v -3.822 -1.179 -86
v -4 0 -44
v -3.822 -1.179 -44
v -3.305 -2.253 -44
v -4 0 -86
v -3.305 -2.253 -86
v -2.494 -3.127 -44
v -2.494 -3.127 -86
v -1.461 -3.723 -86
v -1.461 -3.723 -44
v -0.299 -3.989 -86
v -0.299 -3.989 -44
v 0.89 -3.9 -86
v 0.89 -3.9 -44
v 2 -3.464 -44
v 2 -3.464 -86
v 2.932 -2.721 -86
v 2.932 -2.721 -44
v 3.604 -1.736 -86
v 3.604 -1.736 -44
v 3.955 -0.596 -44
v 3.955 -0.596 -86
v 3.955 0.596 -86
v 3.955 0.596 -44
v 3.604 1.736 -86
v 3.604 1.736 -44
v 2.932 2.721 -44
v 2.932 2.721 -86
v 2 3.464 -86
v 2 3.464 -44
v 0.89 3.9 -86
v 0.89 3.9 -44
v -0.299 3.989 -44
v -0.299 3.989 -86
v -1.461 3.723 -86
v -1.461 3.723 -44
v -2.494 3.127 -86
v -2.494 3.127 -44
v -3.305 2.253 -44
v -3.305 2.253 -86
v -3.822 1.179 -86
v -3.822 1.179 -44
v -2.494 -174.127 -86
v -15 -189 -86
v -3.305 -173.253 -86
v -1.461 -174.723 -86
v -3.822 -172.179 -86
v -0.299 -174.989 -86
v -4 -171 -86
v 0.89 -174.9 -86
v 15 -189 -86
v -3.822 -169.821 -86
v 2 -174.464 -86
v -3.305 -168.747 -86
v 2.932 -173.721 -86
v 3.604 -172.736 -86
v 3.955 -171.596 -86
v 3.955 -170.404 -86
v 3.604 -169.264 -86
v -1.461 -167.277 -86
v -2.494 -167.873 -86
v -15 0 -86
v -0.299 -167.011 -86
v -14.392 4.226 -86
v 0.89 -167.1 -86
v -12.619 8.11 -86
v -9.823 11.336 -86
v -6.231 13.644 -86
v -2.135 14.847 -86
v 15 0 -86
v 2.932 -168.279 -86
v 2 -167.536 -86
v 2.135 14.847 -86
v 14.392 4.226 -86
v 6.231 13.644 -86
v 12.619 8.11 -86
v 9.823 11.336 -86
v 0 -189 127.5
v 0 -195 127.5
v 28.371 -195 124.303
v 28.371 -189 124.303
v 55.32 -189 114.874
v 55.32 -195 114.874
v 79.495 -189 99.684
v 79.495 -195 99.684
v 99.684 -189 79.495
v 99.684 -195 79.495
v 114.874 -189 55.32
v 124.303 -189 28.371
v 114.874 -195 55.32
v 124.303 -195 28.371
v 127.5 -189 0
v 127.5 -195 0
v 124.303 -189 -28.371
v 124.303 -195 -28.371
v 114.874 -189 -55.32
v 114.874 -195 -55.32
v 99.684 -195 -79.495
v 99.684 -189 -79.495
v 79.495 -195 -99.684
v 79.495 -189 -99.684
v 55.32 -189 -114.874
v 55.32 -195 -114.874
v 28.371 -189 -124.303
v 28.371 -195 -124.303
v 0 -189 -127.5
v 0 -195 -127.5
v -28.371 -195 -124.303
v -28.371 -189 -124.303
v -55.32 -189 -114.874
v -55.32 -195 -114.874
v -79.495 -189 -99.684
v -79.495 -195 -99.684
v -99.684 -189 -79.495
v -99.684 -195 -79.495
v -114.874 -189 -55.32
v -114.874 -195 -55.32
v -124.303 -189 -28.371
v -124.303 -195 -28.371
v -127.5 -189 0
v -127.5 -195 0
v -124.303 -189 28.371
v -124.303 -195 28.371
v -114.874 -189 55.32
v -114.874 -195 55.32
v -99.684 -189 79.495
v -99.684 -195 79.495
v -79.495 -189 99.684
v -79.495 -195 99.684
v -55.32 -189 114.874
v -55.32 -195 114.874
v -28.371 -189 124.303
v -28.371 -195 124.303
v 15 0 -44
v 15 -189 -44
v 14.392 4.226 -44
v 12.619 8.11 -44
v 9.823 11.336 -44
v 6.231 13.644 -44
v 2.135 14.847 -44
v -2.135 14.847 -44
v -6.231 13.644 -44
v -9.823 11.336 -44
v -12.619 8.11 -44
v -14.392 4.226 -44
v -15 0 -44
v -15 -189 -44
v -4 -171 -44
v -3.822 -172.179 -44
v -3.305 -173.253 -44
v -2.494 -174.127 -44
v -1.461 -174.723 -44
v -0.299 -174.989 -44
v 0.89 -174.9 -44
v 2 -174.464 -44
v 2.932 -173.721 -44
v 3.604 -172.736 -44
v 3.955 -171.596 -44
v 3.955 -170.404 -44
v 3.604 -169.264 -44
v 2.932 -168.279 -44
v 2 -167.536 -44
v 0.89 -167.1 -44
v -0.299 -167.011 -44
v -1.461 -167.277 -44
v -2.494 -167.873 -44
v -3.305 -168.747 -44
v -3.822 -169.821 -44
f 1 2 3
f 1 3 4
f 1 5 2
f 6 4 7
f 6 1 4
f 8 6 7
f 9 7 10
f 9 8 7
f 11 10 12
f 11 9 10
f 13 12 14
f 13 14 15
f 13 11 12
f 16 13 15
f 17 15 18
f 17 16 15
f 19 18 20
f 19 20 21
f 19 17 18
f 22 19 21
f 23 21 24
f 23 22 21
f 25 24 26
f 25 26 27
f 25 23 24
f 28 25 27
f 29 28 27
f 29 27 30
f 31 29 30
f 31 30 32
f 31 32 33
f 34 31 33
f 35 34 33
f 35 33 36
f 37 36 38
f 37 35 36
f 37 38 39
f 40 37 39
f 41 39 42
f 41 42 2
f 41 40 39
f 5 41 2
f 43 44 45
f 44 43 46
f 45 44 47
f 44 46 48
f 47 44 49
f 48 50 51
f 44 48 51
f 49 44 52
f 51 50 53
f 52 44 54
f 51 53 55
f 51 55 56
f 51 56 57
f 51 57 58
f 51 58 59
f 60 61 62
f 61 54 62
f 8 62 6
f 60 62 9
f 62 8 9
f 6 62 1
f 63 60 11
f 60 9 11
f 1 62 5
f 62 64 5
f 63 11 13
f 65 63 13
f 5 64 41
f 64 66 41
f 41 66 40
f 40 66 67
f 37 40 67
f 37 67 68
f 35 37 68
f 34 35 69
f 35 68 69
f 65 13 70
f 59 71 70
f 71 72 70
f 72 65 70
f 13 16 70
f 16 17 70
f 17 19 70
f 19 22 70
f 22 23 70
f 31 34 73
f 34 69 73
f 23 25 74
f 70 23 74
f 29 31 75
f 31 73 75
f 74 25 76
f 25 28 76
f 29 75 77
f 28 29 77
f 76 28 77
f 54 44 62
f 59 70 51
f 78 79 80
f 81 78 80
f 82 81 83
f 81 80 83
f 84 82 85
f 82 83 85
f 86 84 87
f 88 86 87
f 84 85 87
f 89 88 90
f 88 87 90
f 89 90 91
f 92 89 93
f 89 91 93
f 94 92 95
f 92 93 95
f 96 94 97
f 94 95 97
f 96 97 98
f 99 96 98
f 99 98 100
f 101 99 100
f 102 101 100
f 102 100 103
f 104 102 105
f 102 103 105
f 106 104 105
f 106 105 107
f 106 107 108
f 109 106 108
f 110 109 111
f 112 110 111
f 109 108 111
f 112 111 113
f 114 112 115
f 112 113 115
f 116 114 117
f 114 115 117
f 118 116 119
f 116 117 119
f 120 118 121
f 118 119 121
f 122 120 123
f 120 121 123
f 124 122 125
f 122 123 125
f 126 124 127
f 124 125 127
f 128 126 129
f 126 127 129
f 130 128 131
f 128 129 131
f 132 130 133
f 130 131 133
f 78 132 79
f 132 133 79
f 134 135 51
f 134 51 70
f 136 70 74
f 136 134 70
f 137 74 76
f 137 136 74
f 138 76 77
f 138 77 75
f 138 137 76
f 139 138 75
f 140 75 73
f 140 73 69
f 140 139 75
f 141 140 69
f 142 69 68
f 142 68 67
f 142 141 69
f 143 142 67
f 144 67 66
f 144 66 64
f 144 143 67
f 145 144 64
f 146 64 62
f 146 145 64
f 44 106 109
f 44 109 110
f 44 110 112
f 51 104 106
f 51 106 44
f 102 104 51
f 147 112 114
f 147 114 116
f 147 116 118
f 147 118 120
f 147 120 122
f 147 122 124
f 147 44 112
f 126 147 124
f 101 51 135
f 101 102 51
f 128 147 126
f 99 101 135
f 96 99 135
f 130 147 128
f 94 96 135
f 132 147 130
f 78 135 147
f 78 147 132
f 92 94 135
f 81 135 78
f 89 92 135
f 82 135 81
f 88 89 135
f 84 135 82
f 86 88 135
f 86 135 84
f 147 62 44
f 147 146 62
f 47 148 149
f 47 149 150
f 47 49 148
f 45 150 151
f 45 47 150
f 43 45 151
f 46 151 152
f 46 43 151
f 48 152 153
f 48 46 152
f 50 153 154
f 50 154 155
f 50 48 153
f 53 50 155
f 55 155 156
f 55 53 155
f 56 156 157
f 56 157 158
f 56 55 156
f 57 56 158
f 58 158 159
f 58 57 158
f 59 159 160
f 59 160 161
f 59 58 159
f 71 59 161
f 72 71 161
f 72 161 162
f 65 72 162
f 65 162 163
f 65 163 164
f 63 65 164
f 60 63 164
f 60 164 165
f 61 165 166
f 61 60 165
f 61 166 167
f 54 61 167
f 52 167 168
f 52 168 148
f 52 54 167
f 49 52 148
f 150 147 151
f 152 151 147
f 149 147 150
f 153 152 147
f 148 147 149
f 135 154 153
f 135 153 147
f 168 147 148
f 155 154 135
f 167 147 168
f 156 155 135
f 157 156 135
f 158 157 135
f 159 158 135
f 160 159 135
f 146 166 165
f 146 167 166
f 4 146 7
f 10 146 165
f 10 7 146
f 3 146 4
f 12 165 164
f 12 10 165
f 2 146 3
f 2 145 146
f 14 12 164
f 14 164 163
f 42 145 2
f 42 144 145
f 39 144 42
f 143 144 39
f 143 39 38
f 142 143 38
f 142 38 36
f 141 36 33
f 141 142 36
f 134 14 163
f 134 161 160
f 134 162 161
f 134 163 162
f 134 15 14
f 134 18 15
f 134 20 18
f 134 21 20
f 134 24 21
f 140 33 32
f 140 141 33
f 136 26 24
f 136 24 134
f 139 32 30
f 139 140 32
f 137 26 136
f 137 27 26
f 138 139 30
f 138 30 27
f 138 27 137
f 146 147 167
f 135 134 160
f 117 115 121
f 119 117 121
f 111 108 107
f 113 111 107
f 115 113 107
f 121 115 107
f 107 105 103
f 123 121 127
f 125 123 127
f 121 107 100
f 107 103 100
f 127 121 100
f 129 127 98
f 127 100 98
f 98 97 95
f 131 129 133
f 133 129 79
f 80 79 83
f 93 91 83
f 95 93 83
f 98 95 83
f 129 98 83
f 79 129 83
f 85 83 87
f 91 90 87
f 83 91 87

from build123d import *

# Parameters (mm, degrees)
BOSS_EXTRUDE1_START = -195
SKETCH1_R           = 127.5
BOSS_EXTRUDE1_DEPTH = 6
BOSS_EXTRUDE2_START = -65
SKETCH2_R           = 4
BOSS_EXTRUDE2_DEPTH = 21


with BuildPart() as part:
    # Sketch1 → Boss-Extrude1 (new body)
    with BuildSketch(Plane(origin=(0, 0, 0), x_dir=(1, 0, 0), z_dir=(0, 1, 0)).offset(BOSS_EXTRUDE1_START)):
        with Locations(Location((0, 0, 0), (0, 0, 270))):
            Circle(SKETCH1_R)
    extrude(amount=BOSS_EXTRUDE1_DEPTH)

    # Sketch2 → Boss-Extrude2 (add, symmetric)
    with BuildSketch(Plane.XY.offset(BOSS_EXTRUDE2_START)):
        with BuildLine():
            Line((-15, 0), (-15, -189))
            Line((-15, -189), (15, -189))
            Line((15, -189), (15, 0))
            ThreePointArc((15, 0), (0, 15), (-15, 0))
        make_face()
        with Locations(Location((0, 0, 0), (0, 0, 180))):
            Circle(SKETCH2_R, mode=Mode.SUBTRACT)
        with Locations(Location((0, -171, 0), (0, 0, 180))):
            Circle(SKETCH2_R, mode=Mode.SUBTRACT)
    extrude(amount=BOSS_EXTRUDE2_DEPTH, both=True)


solid = part.part
